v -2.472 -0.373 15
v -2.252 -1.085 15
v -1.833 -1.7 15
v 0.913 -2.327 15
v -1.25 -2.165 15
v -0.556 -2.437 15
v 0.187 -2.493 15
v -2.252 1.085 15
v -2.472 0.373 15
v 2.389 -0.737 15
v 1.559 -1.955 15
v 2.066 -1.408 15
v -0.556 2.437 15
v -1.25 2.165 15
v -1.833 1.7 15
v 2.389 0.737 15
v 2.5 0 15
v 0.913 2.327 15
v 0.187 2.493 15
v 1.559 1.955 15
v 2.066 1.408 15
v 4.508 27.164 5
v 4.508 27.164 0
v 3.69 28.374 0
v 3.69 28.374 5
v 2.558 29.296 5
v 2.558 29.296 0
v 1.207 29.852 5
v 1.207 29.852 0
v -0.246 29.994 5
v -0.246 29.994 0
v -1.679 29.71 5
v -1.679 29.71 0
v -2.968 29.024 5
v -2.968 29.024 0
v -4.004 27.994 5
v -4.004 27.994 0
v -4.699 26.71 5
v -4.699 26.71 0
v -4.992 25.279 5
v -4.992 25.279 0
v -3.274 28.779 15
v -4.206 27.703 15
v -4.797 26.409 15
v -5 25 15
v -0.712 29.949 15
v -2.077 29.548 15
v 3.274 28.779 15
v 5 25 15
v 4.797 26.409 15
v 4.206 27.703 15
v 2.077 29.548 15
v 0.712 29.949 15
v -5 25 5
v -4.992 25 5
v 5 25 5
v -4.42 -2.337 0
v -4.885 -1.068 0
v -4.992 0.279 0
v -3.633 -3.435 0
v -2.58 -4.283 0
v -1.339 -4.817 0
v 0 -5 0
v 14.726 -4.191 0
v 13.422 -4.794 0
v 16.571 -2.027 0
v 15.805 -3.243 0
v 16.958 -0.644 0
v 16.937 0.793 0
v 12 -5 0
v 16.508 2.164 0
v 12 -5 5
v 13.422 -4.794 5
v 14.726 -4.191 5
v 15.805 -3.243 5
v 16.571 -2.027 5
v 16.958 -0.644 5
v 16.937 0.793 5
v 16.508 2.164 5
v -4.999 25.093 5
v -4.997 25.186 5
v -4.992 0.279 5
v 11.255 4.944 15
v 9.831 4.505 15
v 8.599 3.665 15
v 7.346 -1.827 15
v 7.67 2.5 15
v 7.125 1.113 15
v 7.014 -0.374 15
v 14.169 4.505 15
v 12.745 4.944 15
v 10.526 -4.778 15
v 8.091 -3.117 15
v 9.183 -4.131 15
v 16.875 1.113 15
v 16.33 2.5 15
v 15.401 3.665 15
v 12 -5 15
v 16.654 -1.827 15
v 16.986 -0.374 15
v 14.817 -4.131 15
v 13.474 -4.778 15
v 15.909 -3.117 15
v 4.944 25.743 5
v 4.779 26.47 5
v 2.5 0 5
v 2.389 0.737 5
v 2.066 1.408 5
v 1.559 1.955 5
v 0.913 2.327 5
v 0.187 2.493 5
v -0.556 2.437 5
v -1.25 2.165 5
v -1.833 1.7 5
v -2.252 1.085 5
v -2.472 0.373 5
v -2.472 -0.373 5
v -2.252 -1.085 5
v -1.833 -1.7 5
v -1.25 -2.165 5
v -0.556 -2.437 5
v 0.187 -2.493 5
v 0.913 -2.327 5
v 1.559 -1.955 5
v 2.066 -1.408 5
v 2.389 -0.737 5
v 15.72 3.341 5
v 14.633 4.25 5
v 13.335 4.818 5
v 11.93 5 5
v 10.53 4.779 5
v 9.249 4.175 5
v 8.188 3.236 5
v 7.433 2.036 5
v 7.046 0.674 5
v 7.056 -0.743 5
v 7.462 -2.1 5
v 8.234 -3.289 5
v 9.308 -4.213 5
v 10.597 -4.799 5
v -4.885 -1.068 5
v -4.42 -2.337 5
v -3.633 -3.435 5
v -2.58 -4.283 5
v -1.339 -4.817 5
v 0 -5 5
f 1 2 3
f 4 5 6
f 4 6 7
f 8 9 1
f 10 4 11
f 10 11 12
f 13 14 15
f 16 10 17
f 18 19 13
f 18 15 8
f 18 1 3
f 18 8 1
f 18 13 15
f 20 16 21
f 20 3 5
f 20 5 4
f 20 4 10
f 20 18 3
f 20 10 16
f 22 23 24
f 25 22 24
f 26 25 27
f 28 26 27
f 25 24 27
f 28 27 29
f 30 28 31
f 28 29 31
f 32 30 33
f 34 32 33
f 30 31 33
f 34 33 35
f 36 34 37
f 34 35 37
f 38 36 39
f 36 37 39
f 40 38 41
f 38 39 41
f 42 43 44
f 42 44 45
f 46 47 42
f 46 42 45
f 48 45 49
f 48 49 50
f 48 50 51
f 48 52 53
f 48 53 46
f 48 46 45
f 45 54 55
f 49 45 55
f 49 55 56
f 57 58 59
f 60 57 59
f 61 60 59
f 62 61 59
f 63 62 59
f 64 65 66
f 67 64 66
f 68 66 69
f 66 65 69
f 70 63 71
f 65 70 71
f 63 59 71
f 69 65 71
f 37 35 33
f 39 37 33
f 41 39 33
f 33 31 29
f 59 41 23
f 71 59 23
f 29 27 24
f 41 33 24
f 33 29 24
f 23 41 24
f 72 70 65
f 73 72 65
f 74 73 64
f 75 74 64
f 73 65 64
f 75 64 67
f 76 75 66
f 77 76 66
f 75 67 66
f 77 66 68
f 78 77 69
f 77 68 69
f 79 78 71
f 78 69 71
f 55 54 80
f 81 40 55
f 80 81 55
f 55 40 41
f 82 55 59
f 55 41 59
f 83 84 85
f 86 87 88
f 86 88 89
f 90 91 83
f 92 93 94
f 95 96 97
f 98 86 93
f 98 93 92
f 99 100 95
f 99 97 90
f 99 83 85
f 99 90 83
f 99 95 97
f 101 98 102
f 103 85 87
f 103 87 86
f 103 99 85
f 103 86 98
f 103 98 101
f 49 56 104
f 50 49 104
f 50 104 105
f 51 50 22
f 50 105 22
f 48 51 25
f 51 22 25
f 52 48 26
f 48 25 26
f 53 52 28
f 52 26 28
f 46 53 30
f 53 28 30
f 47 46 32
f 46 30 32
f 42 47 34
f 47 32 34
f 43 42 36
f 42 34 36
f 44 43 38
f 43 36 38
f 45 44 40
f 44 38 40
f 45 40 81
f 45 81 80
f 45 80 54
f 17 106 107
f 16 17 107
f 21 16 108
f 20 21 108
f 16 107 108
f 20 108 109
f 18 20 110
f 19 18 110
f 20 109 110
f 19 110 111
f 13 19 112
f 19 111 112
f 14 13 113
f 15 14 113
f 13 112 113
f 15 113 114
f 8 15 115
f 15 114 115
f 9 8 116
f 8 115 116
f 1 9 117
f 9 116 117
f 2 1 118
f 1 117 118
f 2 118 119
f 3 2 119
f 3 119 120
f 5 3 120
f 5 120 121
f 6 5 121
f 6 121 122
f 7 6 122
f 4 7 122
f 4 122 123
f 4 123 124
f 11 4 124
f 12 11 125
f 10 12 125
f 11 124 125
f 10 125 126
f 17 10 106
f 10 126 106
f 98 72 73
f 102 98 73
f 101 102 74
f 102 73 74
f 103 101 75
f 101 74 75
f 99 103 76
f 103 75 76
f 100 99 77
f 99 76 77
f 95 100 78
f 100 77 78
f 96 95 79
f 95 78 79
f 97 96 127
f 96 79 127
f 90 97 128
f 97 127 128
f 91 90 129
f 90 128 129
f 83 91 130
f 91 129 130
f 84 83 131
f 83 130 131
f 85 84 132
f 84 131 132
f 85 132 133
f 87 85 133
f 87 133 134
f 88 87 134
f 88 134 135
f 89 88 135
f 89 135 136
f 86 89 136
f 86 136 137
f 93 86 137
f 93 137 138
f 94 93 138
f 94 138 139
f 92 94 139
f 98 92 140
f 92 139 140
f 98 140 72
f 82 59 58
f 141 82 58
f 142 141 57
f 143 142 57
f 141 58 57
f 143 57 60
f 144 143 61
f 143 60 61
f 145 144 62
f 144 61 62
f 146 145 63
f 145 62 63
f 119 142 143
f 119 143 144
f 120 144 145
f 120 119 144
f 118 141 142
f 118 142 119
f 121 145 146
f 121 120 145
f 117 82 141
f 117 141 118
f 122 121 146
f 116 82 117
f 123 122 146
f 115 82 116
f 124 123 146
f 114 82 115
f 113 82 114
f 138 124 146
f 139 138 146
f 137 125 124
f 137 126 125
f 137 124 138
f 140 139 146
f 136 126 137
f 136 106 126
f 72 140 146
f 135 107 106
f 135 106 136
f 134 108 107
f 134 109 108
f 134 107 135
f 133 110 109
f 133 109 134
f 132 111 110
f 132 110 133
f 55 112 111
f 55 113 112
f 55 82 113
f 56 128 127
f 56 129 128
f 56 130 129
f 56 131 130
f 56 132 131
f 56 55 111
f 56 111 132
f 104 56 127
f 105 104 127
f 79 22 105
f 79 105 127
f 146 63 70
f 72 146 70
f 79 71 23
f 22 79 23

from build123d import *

# Parameters (mm, degrees)
SALIENTE_EXTRUIR1_DEPTH = 5
CROQUIS2_R              = 2.5
CROQUIS2_R_2            = 5
SALIENTE_EXTRUIR2_DEPTH = 10


with BuildPart() as part:
    # Croquis1 → Saliente-Extruir1 (new body)
    with BuildSketch(Plane.XY):
        with BuildLine():
            ThreePointArc((4.507615287, 27.163655338), (-0.972917939, 29.9044297), (-4.992202808, 25.279125636))
            Line((-4.992202808, 25.279125636), (-4.992202808, 24.720874364))
            Line((-4.992202808, 24.720874364), (-4.992202808, 0.279125636))
            ThreePointArc((-4.992202808, 0.279125636), (-3.632879586, -3.435430964), (0, -5))
            Line((0, -5), (12, -5))
            ThreePointArc((12, -5), (16.231918991, -2.662867187), (16.507615287, 2.163655338))
            Line((16.507615287, 2.163655338), (4.507615287, 27.163655338))
        make_face()
    extrude(amount=SALIENTE_EXTRUIR1_DEPTH)

    # Croquis2 → Saliente-Extruir2 (add)
    with BuildSketch(Plane.XY.offset(5)):
        Circle(CROQUIS2_R)
        with Locations(Location((12, 0, 0), (0, 0, 270))):
            Circle(CROQUIS2_R_2)
        with BuildLine():
            Line((-5, 25), (5, 25))
            ThreePointArc((5, 25), (0, 30), (-5, 25))
        make_face()
    extrude(amount=SALIENTE_EXTRUIR2_DEPTH)


solid = part.part
